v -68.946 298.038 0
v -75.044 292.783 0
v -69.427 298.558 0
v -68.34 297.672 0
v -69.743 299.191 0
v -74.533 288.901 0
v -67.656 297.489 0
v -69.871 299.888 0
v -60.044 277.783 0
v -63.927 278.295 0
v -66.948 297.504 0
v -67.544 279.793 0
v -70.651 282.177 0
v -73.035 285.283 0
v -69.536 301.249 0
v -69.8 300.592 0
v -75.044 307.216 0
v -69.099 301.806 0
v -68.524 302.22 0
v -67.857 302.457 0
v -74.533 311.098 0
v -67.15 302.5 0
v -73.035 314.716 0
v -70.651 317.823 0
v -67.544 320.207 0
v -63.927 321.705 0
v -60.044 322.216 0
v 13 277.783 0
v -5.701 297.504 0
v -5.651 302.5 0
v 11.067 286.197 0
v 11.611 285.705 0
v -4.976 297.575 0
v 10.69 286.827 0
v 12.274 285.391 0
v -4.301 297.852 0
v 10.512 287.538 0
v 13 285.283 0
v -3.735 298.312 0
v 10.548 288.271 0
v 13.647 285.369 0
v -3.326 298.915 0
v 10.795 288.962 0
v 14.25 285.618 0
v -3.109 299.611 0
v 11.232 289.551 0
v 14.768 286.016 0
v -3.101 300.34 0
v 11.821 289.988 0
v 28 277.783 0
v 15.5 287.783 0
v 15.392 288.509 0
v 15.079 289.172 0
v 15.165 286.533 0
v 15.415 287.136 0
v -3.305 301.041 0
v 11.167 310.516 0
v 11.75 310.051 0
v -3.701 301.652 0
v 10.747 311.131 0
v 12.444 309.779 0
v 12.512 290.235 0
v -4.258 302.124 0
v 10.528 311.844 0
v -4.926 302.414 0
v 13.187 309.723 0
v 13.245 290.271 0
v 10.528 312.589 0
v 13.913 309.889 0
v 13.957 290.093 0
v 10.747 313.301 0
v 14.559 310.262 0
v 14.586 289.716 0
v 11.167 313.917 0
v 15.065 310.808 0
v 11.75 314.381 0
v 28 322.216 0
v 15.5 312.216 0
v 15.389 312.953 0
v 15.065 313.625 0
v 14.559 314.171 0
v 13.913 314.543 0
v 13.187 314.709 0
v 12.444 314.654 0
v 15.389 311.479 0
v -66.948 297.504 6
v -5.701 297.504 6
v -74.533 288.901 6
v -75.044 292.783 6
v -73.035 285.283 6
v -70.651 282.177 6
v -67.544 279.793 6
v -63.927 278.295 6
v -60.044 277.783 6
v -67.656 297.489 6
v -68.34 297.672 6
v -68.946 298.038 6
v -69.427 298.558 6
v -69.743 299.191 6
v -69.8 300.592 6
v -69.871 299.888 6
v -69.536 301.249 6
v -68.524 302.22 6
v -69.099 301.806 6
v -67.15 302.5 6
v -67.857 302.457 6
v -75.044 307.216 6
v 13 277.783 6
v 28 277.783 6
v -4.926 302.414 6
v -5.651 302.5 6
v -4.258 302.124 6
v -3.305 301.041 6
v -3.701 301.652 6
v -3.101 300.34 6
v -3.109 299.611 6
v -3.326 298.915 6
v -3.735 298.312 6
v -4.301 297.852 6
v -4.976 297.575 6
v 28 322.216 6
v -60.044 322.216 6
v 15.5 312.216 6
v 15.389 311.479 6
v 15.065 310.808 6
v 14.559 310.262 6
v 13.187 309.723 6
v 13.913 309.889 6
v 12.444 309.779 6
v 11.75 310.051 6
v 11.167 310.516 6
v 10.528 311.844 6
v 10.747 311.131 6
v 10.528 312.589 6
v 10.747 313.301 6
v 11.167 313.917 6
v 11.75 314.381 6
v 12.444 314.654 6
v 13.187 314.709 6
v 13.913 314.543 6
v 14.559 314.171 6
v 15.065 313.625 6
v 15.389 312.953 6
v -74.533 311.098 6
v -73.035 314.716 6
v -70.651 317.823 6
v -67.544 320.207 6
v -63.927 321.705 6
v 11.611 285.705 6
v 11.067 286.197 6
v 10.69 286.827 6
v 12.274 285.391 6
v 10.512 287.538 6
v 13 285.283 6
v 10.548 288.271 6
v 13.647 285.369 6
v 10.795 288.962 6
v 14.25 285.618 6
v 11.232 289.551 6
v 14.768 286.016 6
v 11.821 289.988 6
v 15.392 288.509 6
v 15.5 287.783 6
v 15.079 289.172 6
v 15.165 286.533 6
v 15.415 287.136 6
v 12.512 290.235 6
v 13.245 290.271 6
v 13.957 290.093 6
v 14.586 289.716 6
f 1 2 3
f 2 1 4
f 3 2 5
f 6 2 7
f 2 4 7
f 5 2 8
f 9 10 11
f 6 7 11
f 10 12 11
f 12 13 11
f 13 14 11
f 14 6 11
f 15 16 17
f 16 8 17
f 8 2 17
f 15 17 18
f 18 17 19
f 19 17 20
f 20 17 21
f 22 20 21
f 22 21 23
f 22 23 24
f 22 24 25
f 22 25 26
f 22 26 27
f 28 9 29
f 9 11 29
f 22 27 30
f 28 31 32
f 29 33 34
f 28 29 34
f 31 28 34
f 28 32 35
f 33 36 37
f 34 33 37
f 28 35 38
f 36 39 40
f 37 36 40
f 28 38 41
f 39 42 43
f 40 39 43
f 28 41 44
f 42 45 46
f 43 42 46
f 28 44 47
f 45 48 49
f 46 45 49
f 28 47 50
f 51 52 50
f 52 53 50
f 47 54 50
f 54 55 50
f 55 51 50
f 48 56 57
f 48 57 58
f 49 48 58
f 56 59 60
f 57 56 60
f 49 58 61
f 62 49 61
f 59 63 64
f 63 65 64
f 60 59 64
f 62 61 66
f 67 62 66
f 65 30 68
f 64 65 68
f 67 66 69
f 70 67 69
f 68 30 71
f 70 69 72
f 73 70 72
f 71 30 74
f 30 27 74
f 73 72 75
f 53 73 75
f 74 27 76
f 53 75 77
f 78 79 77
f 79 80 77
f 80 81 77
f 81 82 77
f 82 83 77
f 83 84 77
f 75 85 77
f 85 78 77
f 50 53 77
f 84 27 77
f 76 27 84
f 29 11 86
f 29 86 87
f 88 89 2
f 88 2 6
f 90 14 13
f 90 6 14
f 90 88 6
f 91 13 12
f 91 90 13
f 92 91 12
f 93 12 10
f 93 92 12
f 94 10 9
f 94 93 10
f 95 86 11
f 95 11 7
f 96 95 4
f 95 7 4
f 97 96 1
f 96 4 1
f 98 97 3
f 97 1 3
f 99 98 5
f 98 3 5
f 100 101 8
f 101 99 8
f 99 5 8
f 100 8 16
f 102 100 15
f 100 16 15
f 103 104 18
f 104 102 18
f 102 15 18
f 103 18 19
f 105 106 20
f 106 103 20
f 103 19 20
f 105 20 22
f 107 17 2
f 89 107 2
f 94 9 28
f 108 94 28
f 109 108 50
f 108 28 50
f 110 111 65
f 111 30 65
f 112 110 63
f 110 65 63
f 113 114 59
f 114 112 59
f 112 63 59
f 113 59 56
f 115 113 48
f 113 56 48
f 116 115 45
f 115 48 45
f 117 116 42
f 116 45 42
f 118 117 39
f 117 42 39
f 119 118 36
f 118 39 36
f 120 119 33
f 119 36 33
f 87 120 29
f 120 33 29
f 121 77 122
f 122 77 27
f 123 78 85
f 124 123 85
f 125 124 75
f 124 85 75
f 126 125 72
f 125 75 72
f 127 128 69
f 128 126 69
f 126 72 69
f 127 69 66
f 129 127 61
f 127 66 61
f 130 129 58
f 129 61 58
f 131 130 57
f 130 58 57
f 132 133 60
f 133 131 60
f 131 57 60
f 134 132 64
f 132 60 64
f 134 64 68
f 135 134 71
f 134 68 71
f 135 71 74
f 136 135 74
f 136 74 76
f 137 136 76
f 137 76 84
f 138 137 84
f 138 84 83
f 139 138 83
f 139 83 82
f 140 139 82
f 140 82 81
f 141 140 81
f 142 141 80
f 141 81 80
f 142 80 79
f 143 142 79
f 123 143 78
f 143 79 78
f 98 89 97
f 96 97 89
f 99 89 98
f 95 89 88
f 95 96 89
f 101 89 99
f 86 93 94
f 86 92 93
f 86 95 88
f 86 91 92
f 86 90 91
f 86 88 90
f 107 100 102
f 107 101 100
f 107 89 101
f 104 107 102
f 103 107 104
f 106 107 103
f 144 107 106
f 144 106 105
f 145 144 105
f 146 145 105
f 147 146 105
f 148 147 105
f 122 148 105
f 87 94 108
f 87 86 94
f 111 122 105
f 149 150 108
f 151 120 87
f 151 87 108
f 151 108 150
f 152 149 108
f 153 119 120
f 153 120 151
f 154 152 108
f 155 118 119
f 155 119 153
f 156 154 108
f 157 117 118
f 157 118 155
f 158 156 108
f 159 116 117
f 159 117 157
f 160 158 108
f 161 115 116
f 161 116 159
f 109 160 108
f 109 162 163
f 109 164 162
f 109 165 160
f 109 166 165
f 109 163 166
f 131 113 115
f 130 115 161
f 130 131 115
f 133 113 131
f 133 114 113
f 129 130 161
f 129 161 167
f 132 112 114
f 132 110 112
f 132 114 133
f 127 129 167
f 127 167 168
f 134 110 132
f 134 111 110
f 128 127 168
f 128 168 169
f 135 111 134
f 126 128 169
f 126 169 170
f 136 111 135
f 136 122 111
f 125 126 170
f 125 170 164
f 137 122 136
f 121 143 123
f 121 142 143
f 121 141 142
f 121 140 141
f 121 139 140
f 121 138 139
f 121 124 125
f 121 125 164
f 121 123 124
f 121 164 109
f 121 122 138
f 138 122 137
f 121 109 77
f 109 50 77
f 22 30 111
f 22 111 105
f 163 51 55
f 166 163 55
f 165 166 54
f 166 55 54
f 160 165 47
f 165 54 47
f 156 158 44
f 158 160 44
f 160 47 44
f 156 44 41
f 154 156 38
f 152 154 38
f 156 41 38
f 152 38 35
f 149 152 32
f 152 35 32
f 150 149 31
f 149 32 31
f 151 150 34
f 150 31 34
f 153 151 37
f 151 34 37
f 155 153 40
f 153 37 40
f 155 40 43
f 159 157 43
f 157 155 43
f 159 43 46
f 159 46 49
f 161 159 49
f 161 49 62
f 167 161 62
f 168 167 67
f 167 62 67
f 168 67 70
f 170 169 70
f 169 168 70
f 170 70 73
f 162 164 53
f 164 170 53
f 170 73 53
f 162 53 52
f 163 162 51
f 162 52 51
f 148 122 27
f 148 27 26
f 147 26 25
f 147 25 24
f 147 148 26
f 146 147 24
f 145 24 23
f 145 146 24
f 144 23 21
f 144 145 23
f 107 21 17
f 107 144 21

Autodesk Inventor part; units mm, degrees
ref_plane "YZ Plane" through (0, 0, 0) normal (1, 0, 0) x (0, 1, 0)
ref_plane "XZ Plane" through (0, 0, 0) normal (0, 1, 0) x (-1, 0, 0)
ref_plane "XY Plane" through (0, 0, 0) normal (0, 0, 1) x (1, 0, 0)
ref_plane "Work Plane1" through (0, 0, 0) normal (0, 0, 1) x (1, 0, 0)
sketch "Sketch1" plane through (0, 0, 0) normal (0, 0, 1) x (1, 0, 0)
  line L0 (27.9999, -0.0002) -> (27.9999, 599.9998) projected
  line L1 (-2, -0.0002) -> (-2, 599.9998) projected
  line L2 (-75.0445, 277.7834) -> (27.9999, 277.7834)
  line L3 (27.9999, 277.7834) -> (27.9999, 322.2162)
  line L4 (27.9999, 322.2162) -> (-75.0445, 322.2162)
  line L5 (-75.0445, 322.2162) -> (-75.0445, 277.7834)
  line L6 (-75.0445, 277.7834) -> (27.9999, 322.2162) construction
  line L7 (27.9999, 277.7834) -> (-75.0445, 322.2162) construction
  line L8 (-5.6506, 302.4998) -> (-67.1503, 302.4998)
  line L9 (-66.9479, 297.5039) -> (-5.7013, 297.5039)
  line L10 (-5.6506, 302.4998) -> (-66.9479, 297.5039) construction
  line L11 (-67.1503, 302.4998) -> (-5.7013, 297.5039) construction
  arc A0 (-67.1503, 302.4998) -> (-66.9479, 297.5039) centre (-67.3544, 299.9894) ccw
  arc A1 (-5.7013, 297.5039) -> (-5.9109, 302.4785) centre (-5.578, 300.0008) ccw
  line L12 (27.9999, 277.7834) -> (12.9999, 277.7834)
  circle A2 centre (12.9999, 287.7834) radius 2.5
  circle A3 centre (12.9999, 312.2162) radius 2.5
  line L13 (12.9999, 277.7834) -> (12.9999, 285.2834)
  point P0 (0, 0)
  point P1 (-23.5223, 299.9998)
  point P2 (-36.3624, 299.9967)
  dimension "d4" = 5
  dimension "d0" = 5
  dimension "d1" = 15
  dimension "d5" = 5
extrude "Extrusion1" add sketch "Sketch1" along normal blind 6
fillet "Fillet1" radius 15 2 edges at (-75.0445, 277.7834, 3) (-75.0445, 322.2162, 3)
properties part number "Idler"
